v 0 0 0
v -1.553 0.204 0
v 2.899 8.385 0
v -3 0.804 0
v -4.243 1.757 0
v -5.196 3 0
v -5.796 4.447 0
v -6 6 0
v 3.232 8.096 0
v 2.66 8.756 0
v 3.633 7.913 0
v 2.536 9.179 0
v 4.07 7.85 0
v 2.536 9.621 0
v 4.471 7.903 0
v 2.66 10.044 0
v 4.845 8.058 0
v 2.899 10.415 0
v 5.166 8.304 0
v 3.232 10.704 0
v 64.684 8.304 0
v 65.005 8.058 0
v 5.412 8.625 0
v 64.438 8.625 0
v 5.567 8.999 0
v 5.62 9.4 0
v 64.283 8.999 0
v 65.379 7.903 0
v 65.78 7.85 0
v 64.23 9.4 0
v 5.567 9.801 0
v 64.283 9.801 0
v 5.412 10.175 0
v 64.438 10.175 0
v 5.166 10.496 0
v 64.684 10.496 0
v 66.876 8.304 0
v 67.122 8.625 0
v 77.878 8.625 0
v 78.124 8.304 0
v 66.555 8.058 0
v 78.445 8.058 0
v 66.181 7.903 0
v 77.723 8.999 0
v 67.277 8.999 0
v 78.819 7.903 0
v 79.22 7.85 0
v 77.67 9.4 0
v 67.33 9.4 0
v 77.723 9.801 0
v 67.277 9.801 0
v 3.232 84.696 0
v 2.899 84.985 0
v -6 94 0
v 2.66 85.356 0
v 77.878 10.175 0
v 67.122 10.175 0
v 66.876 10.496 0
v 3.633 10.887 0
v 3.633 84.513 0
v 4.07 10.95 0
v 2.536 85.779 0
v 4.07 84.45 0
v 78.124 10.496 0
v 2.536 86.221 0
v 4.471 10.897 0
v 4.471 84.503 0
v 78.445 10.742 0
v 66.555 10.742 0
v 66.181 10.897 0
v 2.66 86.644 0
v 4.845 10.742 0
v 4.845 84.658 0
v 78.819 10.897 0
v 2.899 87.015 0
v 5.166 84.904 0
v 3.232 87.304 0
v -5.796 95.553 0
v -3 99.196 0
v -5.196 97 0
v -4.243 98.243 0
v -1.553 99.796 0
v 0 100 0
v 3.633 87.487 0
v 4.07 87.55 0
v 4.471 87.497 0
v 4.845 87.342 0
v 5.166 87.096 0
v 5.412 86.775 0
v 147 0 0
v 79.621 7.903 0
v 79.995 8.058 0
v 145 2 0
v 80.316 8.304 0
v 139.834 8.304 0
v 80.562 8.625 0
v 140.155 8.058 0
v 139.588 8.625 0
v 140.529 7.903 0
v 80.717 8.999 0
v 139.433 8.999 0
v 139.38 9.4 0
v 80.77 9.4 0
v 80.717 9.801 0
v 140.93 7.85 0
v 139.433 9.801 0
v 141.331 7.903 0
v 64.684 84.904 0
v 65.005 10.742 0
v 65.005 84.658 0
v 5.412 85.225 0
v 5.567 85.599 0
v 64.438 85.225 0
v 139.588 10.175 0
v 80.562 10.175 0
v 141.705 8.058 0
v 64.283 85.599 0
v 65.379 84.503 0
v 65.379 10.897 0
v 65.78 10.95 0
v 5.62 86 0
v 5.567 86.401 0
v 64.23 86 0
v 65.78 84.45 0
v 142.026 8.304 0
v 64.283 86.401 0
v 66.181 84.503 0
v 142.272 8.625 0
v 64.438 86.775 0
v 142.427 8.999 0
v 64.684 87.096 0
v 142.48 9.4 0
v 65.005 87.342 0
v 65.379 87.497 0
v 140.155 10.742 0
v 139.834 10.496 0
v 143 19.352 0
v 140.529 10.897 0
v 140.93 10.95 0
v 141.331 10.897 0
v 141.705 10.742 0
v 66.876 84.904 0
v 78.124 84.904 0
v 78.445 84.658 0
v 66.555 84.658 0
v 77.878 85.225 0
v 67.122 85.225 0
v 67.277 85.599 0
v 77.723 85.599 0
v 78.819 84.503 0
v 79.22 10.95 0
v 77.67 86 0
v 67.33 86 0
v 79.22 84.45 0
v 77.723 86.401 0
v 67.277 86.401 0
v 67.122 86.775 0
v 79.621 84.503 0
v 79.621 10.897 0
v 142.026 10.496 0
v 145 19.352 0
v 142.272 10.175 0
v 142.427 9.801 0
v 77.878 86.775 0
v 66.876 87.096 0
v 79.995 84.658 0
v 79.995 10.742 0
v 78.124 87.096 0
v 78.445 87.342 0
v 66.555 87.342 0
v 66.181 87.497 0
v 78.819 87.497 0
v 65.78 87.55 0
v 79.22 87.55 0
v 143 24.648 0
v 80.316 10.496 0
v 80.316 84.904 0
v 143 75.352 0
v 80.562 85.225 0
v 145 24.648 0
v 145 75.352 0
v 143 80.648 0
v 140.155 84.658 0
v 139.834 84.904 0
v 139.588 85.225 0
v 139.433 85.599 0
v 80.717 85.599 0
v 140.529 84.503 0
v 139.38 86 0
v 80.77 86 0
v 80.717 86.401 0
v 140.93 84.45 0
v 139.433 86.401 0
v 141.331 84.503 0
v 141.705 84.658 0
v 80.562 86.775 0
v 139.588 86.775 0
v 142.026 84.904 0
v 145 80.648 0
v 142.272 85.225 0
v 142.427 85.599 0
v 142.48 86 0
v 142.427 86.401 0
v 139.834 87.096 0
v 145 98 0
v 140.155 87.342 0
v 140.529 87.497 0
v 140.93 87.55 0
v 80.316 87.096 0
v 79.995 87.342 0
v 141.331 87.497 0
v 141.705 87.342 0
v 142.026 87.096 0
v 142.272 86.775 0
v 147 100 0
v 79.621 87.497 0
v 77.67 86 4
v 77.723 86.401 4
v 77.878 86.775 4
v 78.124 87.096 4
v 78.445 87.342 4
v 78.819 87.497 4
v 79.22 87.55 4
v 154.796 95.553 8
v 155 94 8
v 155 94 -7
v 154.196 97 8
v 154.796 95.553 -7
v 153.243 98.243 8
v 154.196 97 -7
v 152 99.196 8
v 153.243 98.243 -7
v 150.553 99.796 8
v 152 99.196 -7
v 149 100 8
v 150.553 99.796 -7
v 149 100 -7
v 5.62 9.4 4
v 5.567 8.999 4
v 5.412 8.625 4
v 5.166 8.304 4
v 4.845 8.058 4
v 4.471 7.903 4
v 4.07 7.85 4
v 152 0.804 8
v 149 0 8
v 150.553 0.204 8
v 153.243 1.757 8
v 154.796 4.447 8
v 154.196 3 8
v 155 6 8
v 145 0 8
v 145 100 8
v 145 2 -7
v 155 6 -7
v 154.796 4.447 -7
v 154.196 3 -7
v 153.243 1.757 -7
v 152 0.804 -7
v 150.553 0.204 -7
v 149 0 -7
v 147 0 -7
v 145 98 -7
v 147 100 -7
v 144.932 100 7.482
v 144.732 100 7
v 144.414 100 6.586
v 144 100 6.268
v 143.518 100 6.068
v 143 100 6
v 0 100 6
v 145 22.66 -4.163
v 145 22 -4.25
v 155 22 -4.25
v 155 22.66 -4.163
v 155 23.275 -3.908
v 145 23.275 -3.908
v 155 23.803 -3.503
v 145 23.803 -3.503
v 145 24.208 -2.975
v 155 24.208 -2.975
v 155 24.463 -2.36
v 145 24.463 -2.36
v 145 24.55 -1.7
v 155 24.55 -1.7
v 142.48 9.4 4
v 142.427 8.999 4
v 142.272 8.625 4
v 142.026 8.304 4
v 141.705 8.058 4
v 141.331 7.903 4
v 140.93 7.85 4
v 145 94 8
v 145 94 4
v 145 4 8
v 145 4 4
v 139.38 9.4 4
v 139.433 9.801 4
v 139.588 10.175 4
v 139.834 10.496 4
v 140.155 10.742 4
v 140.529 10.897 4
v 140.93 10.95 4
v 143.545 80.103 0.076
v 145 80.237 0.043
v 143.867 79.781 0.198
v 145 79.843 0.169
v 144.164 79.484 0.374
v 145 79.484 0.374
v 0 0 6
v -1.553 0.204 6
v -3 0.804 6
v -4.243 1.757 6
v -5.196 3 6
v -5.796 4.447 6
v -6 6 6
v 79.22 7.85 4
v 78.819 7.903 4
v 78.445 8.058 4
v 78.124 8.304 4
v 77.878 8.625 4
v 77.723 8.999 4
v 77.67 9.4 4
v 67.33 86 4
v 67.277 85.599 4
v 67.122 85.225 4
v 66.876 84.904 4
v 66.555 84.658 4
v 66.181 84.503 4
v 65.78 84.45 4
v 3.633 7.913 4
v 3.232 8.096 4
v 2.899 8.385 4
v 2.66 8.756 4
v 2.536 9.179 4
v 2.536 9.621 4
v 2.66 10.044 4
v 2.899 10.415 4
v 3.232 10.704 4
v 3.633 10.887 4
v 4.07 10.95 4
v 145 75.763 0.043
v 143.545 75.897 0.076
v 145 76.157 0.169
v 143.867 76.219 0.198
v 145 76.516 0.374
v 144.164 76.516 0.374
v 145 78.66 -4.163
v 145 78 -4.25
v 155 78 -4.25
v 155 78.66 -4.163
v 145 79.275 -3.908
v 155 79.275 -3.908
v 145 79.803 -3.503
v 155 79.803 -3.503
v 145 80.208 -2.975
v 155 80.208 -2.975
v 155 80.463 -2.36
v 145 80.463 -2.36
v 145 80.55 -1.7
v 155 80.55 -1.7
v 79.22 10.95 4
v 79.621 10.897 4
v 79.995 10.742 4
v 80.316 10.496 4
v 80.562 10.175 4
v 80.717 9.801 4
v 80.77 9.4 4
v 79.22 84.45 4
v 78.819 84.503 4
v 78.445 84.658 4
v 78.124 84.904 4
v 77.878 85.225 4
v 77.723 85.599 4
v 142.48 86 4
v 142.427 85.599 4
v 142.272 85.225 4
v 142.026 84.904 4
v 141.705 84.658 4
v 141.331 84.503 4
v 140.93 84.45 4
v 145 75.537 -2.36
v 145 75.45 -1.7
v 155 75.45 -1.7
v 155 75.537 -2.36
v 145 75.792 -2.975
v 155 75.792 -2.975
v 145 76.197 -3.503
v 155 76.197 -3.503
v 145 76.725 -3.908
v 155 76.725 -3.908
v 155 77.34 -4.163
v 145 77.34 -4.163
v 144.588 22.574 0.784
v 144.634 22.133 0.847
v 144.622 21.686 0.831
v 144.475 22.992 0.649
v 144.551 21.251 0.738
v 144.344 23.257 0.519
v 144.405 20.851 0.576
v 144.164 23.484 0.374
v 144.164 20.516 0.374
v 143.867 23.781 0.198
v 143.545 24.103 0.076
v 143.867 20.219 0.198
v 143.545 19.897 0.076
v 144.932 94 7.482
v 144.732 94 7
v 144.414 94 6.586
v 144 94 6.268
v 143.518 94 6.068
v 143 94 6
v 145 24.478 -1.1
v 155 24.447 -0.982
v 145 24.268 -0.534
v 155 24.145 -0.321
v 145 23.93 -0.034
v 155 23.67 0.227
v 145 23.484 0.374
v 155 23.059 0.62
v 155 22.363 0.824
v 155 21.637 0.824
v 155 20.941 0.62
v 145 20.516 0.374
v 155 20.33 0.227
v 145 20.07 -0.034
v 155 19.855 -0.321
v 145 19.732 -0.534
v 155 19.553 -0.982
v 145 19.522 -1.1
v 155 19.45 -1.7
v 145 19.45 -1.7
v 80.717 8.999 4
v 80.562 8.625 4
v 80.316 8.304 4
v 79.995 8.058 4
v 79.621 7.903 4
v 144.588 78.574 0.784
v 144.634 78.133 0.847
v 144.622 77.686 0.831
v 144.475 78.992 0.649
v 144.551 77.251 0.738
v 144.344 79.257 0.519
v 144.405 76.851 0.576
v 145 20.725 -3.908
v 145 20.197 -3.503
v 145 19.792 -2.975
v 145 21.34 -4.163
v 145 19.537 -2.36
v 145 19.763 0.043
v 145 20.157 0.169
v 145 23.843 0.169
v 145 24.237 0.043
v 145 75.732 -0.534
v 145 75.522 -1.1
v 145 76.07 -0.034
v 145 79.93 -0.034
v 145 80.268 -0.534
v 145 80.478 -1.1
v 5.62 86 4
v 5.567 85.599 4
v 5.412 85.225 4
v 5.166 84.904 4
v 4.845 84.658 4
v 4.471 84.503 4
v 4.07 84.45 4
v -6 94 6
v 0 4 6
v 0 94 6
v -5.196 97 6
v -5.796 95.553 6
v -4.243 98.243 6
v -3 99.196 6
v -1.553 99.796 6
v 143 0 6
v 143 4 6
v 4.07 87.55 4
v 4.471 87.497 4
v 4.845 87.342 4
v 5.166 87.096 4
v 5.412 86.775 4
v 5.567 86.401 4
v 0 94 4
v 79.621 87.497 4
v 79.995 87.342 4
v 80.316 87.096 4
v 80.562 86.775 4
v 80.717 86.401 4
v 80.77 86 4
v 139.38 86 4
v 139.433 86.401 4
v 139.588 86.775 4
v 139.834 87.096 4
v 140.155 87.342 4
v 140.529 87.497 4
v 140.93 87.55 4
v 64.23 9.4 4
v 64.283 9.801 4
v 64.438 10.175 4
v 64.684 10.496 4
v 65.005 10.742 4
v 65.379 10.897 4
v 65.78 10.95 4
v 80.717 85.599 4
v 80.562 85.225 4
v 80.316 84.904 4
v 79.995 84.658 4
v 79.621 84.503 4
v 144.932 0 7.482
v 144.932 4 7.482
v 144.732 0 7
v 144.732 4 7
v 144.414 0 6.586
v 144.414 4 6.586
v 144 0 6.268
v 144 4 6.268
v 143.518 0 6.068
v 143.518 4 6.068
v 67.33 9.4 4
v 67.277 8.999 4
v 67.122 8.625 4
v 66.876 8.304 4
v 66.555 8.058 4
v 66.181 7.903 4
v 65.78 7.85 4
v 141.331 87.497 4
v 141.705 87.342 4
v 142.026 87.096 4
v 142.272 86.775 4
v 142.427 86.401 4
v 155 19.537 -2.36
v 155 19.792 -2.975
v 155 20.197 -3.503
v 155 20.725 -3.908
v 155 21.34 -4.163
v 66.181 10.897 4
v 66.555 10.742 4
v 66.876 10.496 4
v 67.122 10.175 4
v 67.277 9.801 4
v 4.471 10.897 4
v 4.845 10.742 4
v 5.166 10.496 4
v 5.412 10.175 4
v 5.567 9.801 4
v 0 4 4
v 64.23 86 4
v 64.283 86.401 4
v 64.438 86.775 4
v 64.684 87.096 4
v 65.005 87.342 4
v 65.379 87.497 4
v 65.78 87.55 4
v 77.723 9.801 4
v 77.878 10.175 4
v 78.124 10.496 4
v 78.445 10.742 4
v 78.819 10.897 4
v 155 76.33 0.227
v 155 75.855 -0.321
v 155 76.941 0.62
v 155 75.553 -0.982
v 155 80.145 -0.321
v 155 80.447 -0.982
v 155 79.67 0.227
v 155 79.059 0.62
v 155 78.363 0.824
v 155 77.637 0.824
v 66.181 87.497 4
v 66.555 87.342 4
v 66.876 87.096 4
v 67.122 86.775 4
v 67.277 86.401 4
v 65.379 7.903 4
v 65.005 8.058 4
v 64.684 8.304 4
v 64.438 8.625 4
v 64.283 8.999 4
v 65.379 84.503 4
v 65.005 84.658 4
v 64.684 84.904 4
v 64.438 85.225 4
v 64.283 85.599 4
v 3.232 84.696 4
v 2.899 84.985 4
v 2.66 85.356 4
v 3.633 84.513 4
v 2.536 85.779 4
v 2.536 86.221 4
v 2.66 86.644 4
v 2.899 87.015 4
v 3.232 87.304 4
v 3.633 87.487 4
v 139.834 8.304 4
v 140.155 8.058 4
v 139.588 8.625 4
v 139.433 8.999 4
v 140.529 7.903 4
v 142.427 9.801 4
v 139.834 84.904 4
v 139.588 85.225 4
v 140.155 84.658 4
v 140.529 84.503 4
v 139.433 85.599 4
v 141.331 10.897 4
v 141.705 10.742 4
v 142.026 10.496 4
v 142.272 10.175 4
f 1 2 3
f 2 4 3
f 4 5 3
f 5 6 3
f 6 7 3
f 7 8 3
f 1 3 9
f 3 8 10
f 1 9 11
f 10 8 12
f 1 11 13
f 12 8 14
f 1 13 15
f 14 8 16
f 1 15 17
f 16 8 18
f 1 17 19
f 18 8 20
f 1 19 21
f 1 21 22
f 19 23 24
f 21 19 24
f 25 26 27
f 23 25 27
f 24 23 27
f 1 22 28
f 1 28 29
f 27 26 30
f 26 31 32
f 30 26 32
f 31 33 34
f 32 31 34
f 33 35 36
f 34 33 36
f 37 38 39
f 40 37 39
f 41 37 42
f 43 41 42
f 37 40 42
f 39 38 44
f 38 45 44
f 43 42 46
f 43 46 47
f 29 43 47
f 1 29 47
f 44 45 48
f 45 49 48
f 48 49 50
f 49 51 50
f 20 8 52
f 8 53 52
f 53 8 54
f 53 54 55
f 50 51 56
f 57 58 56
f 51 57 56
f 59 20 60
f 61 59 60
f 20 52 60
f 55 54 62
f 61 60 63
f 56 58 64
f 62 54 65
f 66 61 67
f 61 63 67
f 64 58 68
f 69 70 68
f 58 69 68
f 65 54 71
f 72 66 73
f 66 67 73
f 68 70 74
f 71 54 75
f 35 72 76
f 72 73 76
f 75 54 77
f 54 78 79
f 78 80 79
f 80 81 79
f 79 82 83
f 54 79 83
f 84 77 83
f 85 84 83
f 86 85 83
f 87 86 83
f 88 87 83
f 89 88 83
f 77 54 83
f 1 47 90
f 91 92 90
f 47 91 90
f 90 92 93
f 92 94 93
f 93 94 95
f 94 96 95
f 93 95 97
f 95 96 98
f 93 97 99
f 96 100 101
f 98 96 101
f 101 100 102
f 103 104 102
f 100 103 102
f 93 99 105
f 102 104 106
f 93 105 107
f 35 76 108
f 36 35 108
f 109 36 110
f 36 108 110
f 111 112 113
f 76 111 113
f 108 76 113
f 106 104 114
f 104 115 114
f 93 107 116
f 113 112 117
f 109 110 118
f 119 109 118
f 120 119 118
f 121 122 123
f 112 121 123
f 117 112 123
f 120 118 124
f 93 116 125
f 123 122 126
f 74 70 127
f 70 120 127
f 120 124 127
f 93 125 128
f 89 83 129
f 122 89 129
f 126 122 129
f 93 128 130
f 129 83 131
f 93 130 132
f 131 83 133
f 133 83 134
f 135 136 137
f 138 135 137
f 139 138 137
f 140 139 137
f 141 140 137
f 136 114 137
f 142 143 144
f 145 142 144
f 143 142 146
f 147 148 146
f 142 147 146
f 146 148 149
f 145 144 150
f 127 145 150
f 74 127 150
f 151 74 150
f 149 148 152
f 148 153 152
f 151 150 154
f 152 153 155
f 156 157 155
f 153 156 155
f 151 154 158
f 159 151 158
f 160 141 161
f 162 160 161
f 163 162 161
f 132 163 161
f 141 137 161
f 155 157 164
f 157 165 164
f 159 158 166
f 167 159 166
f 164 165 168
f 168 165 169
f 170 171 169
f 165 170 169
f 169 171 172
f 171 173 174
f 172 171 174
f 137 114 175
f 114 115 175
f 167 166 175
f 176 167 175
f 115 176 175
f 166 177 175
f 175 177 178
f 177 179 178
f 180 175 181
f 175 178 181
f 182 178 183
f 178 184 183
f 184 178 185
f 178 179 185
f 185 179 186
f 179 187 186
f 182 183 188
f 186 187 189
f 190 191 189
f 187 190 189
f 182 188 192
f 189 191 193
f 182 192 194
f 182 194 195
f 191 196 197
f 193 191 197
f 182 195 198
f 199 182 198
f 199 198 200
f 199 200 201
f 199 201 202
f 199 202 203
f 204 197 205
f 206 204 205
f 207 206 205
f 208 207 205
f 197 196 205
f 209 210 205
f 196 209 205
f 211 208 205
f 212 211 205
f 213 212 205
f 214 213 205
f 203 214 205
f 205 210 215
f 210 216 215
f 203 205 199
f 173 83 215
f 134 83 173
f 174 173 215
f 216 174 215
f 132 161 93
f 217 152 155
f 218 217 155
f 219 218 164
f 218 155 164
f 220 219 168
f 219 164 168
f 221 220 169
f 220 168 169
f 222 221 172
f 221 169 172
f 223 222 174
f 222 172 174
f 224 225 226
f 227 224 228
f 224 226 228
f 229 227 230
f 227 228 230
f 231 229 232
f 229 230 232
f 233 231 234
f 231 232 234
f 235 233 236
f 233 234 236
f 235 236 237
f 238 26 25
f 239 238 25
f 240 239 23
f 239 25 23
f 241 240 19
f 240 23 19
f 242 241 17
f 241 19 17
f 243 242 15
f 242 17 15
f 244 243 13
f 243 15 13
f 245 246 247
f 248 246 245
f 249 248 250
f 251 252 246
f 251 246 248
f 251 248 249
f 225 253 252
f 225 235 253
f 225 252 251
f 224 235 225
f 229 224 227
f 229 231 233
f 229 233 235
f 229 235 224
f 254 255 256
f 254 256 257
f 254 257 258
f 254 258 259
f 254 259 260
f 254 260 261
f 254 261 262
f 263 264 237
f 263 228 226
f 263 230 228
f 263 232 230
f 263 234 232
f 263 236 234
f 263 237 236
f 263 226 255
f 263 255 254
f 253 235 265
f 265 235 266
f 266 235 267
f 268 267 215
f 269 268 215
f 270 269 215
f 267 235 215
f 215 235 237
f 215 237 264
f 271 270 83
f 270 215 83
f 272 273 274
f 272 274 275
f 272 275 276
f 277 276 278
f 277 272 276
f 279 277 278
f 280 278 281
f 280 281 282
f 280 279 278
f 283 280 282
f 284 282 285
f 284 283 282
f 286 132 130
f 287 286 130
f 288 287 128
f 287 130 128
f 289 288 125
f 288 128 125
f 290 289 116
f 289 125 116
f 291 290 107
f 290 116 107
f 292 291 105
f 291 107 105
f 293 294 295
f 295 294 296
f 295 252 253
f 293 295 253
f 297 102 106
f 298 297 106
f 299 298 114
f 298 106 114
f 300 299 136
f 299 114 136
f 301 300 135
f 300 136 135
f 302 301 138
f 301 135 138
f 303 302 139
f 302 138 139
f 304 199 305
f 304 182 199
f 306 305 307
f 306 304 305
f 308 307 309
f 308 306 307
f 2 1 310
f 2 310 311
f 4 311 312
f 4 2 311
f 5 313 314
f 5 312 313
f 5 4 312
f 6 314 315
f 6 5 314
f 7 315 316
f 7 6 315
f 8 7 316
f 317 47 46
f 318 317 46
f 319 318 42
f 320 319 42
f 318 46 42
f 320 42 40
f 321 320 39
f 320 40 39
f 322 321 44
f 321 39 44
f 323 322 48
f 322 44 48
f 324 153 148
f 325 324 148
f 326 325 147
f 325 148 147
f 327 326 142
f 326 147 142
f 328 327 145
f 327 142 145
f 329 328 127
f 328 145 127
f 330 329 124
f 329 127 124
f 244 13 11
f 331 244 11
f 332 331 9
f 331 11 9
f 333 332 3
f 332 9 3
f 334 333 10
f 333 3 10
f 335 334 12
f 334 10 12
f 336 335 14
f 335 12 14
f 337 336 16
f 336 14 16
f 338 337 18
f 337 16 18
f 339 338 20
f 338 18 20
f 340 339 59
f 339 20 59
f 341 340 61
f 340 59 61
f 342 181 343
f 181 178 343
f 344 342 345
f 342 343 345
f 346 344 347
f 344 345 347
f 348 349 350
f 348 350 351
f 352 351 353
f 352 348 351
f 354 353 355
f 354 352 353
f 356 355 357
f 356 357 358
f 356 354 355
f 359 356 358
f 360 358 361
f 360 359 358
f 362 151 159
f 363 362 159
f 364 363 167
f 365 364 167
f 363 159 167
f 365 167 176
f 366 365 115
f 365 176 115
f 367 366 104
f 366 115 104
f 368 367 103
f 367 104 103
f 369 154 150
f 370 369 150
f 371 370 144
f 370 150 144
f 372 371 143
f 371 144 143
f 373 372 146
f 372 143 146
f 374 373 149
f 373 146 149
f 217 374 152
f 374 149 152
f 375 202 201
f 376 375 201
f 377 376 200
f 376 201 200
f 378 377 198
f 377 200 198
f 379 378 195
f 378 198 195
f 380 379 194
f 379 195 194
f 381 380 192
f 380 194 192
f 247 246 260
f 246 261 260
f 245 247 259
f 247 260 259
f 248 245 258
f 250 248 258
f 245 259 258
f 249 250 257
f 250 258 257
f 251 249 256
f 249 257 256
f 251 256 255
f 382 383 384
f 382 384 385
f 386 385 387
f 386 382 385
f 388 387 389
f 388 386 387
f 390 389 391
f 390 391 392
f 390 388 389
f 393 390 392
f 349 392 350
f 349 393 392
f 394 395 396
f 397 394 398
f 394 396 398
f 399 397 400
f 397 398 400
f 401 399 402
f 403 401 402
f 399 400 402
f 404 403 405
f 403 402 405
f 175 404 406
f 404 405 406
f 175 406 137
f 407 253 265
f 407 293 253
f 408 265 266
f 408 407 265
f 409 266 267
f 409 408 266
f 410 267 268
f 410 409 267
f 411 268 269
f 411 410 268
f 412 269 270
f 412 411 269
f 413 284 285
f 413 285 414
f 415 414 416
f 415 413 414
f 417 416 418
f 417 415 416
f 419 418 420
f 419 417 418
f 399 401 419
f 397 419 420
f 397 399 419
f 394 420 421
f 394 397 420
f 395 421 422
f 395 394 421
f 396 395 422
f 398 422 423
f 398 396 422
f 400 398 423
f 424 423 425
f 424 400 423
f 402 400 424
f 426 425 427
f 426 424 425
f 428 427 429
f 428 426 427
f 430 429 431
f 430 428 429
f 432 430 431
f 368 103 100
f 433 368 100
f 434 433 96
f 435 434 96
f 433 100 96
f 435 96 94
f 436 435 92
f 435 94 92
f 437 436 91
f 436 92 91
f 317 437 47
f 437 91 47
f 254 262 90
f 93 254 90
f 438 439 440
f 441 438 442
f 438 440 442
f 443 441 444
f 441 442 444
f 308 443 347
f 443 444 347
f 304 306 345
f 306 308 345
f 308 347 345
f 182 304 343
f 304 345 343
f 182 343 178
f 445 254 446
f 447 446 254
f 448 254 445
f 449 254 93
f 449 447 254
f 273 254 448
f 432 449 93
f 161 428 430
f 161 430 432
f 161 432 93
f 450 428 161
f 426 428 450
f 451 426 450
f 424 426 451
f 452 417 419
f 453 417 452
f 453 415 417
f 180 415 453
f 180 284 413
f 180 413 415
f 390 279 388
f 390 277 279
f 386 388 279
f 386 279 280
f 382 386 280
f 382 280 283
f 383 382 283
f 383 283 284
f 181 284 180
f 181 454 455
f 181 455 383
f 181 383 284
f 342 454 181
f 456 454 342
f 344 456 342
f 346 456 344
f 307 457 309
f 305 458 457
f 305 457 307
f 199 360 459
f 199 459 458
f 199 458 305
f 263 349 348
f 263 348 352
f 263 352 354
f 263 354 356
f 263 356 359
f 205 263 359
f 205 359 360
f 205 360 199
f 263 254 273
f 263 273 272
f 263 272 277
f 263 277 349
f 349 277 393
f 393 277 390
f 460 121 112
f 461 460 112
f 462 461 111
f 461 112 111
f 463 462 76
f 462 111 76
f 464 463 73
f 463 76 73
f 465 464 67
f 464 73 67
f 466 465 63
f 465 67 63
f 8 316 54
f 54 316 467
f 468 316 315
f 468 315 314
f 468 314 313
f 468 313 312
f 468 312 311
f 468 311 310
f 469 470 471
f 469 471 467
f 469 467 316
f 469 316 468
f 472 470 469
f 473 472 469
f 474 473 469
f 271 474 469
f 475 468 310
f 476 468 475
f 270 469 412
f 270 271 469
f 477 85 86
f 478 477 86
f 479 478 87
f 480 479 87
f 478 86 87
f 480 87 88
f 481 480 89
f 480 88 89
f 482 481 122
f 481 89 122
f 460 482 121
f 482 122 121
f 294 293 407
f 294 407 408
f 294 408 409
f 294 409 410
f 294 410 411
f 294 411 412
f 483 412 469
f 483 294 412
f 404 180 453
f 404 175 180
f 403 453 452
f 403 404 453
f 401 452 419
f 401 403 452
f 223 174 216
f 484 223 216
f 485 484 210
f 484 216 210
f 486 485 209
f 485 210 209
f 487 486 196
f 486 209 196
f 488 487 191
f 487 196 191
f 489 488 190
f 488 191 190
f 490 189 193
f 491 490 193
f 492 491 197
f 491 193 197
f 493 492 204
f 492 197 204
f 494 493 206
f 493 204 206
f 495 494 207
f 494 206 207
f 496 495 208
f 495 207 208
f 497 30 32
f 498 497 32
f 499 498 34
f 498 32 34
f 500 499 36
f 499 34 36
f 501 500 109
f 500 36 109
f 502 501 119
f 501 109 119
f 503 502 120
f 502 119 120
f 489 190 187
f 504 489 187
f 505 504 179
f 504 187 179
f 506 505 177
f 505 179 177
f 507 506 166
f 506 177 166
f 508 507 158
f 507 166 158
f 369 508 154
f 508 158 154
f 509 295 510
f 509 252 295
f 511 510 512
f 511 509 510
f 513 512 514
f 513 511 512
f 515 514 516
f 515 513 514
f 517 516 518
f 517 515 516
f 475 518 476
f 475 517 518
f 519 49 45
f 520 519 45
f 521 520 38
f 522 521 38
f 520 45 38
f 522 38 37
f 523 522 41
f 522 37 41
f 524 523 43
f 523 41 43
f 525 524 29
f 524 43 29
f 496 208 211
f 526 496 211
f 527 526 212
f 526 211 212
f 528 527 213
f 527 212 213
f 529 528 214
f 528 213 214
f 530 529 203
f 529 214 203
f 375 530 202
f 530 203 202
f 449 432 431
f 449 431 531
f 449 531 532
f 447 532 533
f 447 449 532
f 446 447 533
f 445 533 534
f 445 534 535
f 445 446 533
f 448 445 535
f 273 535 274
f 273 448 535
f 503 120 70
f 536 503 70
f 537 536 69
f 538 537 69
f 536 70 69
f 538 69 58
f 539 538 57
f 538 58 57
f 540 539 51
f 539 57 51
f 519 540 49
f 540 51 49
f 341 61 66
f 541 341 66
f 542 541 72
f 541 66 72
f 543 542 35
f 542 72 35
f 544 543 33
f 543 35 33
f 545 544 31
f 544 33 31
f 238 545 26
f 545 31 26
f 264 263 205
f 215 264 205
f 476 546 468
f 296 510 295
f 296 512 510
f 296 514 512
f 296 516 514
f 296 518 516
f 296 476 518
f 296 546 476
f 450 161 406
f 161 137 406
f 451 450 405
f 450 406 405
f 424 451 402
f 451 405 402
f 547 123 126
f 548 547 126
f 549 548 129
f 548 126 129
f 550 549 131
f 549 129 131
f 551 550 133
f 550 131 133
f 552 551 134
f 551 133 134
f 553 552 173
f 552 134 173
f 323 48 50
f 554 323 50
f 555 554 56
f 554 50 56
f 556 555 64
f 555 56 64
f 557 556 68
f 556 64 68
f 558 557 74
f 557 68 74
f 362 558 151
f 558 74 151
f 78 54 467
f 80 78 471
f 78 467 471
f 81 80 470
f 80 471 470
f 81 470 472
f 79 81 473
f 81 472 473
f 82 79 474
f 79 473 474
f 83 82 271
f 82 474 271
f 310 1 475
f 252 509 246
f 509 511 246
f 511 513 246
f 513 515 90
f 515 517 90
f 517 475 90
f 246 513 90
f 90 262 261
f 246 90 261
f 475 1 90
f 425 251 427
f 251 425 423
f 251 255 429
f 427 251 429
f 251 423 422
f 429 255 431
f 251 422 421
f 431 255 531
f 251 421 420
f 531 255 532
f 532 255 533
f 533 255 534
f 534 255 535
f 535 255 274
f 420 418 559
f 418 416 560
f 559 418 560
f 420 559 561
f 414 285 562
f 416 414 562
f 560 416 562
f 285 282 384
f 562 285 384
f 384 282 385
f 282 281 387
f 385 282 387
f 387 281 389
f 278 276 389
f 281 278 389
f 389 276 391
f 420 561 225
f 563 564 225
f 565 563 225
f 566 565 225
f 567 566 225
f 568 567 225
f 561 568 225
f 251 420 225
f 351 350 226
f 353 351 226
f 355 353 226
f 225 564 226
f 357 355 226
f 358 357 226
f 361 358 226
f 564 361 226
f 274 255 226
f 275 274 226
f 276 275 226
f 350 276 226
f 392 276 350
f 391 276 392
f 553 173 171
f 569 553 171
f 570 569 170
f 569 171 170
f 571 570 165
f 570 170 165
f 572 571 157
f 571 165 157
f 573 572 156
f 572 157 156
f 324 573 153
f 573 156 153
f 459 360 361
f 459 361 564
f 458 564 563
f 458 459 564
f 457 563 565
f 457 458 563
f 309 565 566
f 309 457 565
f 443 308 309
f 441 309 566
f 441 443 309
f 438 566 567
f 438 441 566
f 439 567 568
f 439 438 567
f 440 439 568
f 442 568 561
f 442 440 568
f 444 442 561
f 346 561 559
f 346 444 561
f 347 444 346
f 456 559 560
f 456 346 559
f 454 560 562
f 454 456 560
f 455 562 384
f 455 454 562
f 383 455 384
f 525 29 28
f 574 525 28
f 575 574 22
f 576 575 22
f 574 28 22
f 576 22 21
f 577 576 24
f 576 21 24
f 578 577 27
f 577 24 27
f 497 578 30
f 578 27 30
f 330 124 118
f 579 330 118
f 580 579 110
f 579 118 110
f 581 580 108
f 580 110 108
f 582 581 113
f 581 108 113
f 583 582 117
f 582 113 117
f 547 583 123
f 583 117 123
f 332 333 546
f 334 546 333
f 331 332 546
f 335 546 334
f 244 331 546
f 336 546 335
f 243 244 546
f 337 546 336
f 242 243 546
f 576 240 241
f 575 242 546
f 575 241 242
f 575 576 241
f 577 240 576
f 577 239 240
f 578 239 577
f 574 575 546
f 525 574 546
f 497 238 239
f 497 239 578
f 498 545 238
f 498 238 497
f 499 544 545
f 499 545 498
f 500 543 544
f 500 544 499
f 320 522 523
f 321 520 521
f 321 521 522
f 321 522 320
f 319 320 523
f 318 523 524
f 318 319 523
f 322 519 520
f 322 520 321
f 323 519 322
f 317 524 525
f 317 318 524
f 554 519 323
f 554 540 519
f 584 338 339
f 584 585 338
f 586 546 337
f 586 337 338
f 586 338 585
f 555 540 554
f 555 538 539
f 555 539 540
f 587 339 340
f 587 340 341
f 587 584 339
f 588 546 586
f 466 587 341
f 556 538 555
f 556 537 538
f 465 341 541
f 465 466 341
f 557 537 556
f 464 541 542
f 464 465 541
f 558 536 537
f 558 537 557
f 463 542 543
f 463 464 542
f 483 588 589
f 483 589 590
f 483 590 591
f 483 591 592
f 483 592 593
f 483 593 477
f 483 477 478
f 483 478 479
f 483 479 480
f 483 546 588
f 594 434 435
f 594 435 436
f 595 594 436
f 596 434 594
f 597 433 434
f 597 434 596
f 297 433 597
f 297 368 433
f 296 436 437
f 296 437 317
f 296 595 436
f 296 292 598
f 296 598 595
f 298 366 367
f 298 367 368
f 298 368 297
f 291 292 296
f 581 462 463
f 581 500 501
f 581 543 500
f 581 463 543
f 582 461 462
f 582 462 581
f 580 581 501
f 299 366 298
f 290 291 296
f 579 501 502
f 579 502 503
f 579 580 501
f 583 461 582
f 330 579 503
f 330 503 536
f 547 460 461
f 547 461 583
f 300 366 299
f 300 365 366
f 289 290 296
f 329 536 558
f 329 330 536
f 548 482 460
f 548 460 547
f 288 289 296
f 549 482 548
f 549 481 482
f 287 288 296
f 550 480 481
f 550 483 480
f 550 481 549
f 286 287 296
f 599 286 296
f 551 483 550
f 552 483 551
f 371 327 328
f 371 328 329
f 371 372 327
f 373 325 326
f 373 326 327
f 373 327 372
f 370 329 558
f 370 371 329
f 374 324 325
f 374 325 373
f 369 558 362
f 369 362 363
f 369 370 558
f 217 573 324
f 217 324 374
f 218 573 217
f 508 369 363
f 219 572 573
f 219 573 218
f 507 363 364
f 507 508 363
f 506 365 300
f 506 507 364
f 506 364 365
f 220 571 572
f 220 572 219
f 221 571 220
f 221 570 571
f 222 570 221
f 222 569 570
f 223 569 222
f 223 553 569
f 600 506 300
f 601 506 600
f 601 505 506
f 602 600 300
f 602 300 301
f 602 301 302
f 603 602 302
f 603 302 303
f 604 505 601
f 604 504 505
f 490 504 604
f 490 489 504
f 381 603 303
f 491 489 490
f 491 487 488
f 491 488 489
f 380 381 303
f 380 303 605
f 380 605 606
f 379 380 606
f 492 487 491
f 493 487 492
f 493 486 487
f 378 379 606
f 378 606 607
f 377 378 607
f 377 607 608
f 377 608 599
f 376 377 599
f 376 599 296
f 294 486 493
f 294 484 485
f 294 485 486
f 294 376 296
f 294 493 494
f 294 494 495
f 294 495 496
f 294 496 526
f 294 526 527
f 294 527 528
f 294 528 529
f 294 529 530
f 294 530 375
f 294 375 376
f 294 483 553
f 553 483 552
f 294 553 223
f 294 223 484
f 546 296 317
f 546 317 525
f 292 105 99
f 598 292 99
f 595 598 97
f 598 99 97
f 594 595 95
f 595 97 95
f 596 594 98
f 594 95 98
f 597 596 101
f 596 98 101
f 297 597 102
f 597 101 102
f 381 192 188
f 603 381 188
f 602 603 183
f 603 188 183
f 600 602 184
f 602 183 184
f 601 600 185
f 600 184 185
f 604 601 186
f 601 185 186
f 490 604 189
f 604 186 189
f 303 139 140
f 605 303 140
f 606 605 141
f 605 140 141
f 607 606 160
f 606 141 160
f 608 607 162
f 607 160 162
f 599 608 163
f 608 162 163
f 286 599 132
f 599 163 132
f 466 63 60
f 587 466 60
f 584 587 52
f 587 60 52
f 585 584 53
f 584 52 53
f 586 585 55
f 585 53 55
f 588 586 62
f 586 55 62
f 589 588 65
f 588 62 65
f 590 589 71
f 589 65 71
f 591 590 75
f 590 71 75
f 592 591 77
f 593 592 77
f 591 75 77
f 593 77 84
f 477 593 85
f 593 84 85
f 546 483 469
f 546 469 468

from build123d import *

# Parameters (mm, degrees)
SKETCH1_W                       = 5.3
SKETCH1_H                       = 76.6
SKETCH1_H_2                     = 9.4
SKETCH1_H_3                     = 14
BOSS_EXTRUDE1_DEPTH             = 4
BOSS_EXTRUDE2_DEPTH             = 100
BOSS_EXTRUDE3_REACH             = 186.786
BOSS_EXTRUDE3_DIRECTION_2_REACH = 186.786
FILLET1_R                       = 6
CHAMFER1_SIZE                   = 2
CUT_EXTRUDE1_START              = -4
CUT_EXTRUDE1_DEPTH              = 4
BOSS_EXTRUDE4_DEPTH             = 2
FILLET3_R                       = 2
CUT_EXTRUDE2_START              = -10
CUT_EXTRUDE2_DEPTH              = 10
FILLET4_R                       = 2
FILLET5_R                       = 2


# Some blends are built 0.0001 mm under size
with BuildPart() as part:
    # Sketch1 → Boss-Extrude1 (new body)
    with BuildSketch(Plane.XY):
        with BuildLine():
            Line((0, 100), (0, 0))
            Line((0, 0), (4.07, 0))
            Line((4.07, 0), (4.07, 7.85))
            ThreePointArc((4.07, 7.85), (2.52, 9.4), (4.07, 10.95))
            Line((4.07, 10.95), (4.07, 84.45))
            ThreePointArc((4.07, 84.45), (2.52, 86), (4.07, 87.55))
            Line((4.07, 87.55), (4.07, 100))
            Line((4.07, 100), (0, 100))
        make_face()
        with BuildLine():
            Line((65.78, 100), (4.07, 100))
            Line((4.07, 100), (4.07, 87.55))
            ThreePointArc((4.07, 87.55), (5.166015511, 87.096015511), (5.62, 86))
            Line((5.62, 86), (64.23, 86))
            ThreePointArc((64.23, 86), (64.683984489, 87.096015511), (65.78, 87.55))
            Line((65.78, 87.55), (65.78, 100))
        make_face()
        with BuildLine():
            Line((4.07, 84.45), (4.07, 10.95))
            ThreePointArc((4.07, 10.95), (5.166015511, 10.496015511), (5.62, 9.4))
            Line((5.62, 9.4), (64.23, 9.4))
            ThreePointArc((64.23, 9.4), (64.683984489, 10.496015511), (65.78, 10.95))
            Line((65.78, 10.95), (65.78, 84.45))
            ThreePointArc((65.78, 84.45), (64.683984489, 84.903984489), (64.23, 86))
            Line((64.23, 86), (5.62, 86))
            ThreePointArc((5.62, 86), (5.166015511, 84.903984489), (4.07, 84.45))
        make_face()
        with BuildLine():
            Line((4.07, 7.85), (4.07, 0))
            Line((4.07, 0), (65.78, 0))
            Line((65.78, 0), (65.78, 7.85))
            ThreePointArc((65.78, 7.85), (64.683984489, 8.303984489), (64.23, 9.4))
            Line((64.23, 9.4), (5.62, 9.4))
            ThreePointArc((5.62, 9.4), (5.166015511, 8.303984489), (4.07, 7.85))
        make_face()
        with BuildLine():
            Line((67.33, 9.4), (69.85, 9.4))
            Line((69.85, 9.4), (69.85, 86))
            Line((69.85, 86), (67.33, 86))
            ThreePointArc((67.33, 86), (66.876015511, 84.903984489), (65.78, 84.45))
            Line((65.78, 84.45), (65.78, 10.95))
            ThreePointArc((65.78, 10.95), (66.876015511, 10.496015511), (67.33, 9.4))
        make_face()
        with Locations((72.5, 47.7)):
            Rectangle(SKETCH1_W, SKETCH1_H)
        with BuildLine():
            Line((75.15, 86), (75.15, 9.4))
            Line((75.15, 9.4), (77.67, 9.4))
            ThreePointArc((77.67, 9.4), (78.123984489, 10.496015511), (79.22, 10.95))
            Line((79.22, 10.95), (79.22, 84.45))
            ThreePointArc((79.22, 84.45), (78.123984489, 84.903984489), (77.67, 86))
            Line((77.67, 86), (75.15, 86))
        make_face()
        with BuildLine():
            Line((65.78, 7.85), (65.78, 0))
            Line((65.78, 0), (69.85, 0))
            Line((69.85, 0), (69.85, 9.4))
            Line((69.85, 9.4), (67.33, 9.4))
            ThreePointArc((67.33, 9.4), (66.876015511, 8.303984489), (65.78, 7.85))
        make_face()
        with Locations((72.5, 4.7)):
            Rectangle(SKETCH1_W, SKETCH1_H_2)
        with BuildLine():
            Line((75.15, 9.4), (75.15, 0))
            Line((75.15, 0), (79.22, 0))
            Line((79.22, 0), (79.22, 7.85))
            ThreePointArc((79.22, 7.85), (78.123984489, 8.303984489), (77.67, 9.4))
            Line((77.67, 9.4), (75.15, 9.4))
        make_face()
        with BuildLine():
            Line((69.85, 100), (65.78, 100))
            Line((65.78, 100), (65.78, 87.55))
            ThreePointArc((65.78, 87.55), (66.876015511, 87.096015511), (67.33, 86))
            Line((67.33, 86), (69.85, 86))
            Line((69.85, 86), (69.85, 100))
        make_face()
        with Locations((72.5, 93)):
            Rectangle(SKETCH1_W, SKETCH1_H_3)
        with BuildLine():
            Line((79.22, 100), (75.15, 100))
            Line((75.15, 100), (75.15, 86))
            Line((75.15, 86), (77.67, 86))
            ThreePointArc((77.67, 86), (78.123984489, 87.096015511), (79.22, 87.55))
            Line((79.22, 87.55), (79.22, 100))
        make_face()
        with BuildLine():
            Line((140.93, 100), (79.22, 100))
            Line((79.22, 100), (79.22, 87.55))
            ThreePointArc((79.22, 87.55), (80.316015511, 87.096015511), (80.77, 86))
            Line((80.77, 86), (139.38, 86))
            ThreePointArc((139.38, 86), (139.833984489, 87.096015511), (140.93, 87.55))
            Line((140.93, 87.55), (140.93, 100))
        make_face()
        with BuildLine():
            ThreePointArc((79.22, 10.95), (80.316015511, 10.496015511), (80.77, 9.4))
            Line((80.77, 9.4), (139.38, 9.4))
            ThreePointArc((139.38, 9.4), (139.833984489, 10.496015511), (140.93, 10.95))
            Line((140.93, 10.95), (140.93, 84.45))
            ThreePointArc((140.93, 84.45), (139.833984489, 84.903984489), (139.38, 86))
            Line((139.38, 86), (80.77, 86))
            ThreePointArc((80.77, 86), (80.316015511, 84.903984489), (79.22, 84.45))
            Line((79.22, 84.45), (79.22, 10.95))
        make_face()
        with BuildLine():
            Line((140.93, 7.85), (140.93, 0))
            Line((140.93, 0), (145, 0))
            Line((145, 0), (145, 100))
            Line((145, 100), (140.93, 100))
            Line((140.93, 100), (140.93, 87.55))
            ThreePointArc((140.93, 87.55), (142.026015511, 87.096015511), (142.48, 86))
            ThreePointArc((142.48, 86), (142.026015511, 84.903984489), (140.93, 84.45))
            Line((140.93, 84.45), (140.93, 10.95))
            ThreePointArc((140.93, 10.95), (142.026015511, 10.496015511), (142.48, 9.4))
            ThreePointArc((142.48, 9.4), (142.026015511, 8.303984489), (140.93, 7.85))
        make_face()
        with BuildLine():
            Line((79.22, 7.85), (79.22, 0))
            Line((79.22, 0), (140.93, 0))
            Line((140.93, 0), (140.93, 7.85))
            ThreePointArc((140.93, 7.85), (139.833984489, 8.303984489), (139.38, 9.4))
            Line((139.38, 9.4), (80.77, 9.4))
            ThreePointArc((80.77, 9.4), (80.316015511, 8.303984489), (79.22, 7.85))
        make_face()
    extrude(amount=BOSS_EXTRUDE1_DEPTH)

    # Sketch2 → Boss-Extrude2 (add)
    with BuildSketch(Plane(origin=(0, 100, 0), x_dir=(1, 0, 0), z_dir=(0, 1, 0))):
        Polygon((145, 7), (145, 0), (145, -4), (145, -10), (155, -10), (155, 7), align=None)
    extrude(amount=-BOSS_EXTRUDE2_DEPTH)

    # Boss-Extrude3: up to this face of the body (flat: up to its plane)
    boss_extrude3_end = Plane(part.part.faces().sort_by_distance((150, 50, 10))[0])
    # Sketch3 → Boss-Extrude3 (add, up to the picked face)
    with BuildSketch(Plane.XY.offset(4), mode=Mode.PRIVATE) as boss_extrude3_sk1:
        Polygon((145, 100), (145, 94), (0, 94), (0, 4), (145, 4), (145, 0), (0, 0), (-6, 0), (-6, 100), align=None)
    boss_extrude3_tool1 = split(extrude(boss_extrude3_sk1.sketch, amount=BOSS_EXTRUDE3_REACH, mode=Mode.PRIVATE), bisect_by=boss_extrude3_end, keep=Keep.BOTH, mode=Mode.PRIVATE)
    add(boss_extrude3_tool1.solids().sort_by(Axis((143.188895, 97, 4), (0, 0, 1)))[0])

    # Boss-Extrude3 direction 2: up to this face of the body (flat: up to its plane)
    boss_extrude3_direction_2_end = Plane(part.part.faces().sort_by_distance((72.5, 50.009617792, 0))[0])
    # Sketch3 → Boss-Extrude3 direction 2 (add, up to the picked face)
    with BuildSketch(Plane.XY.offset(4), mode=Mode.PRIVATE) as boss_extrude3_direction_2_sk1:
        Polygon((145, 100), (145, 94), (0, 94), (0, 4), (145, 4), (145, 0), (0, 0), (-6, 0), (-6, 100), align=None)
    boss_extrude3_direction_2_tool1 = split(extrude(boss_extrude3_direction_2_sk1.sketch, amount=-BOSS_EXTRUDE3_DIRECTION_2_REACH, mode=Mode.PRIVATE), bisect_by=boss_extrude3_direction_2_end, keep=Keep.BOTH, mode=Mode.PRIVATE)
    add(boss_extrude3_direction_2_tool1.solids().sort_by(Axis((143.188895, 97, 4), (0, 0, -1)))[0])

    # Fillet1
    fillet1_edges = [part.edges().sort_by_distance(p)[0] for p in [
        (155, 100, 1.5),
        (155, 0, 1.5),
        (-6, 0, 5),
        (-6, 100, 5),
    ]]
    fillet(fillet1_edges, radius=FILLET1_R)

    # Chamfer1
    chamfer1_edges = [part.edges().sort_by_distance(p)[0] for p in [
        (145, 0, -3.5),
        (145, 100, -3.5),
    ]]
    chamfer(chamfer1_edges, length=CHAMFER1_SIZE)

    # Sketch4 → Cut-Extrude1 (cut)
    with BuildSketch(Plane.XY.offset(10).offset(CUT_EXTRUDE1_START)):
        with BuildLine():
            Line((-6, 94), (-6, 6))
            ThreePointArc((-6, 6), (-4.242640687, 1.757359313), (0, 0))
            Line((0, 0), (149, 0))
            ThreePointArc((149, 0), (153.242640687, 1.757359313), (155, 6))
            Line((155, 6), (155, 94))
            ThreePointArc((155, 94), (153.242640687, 98.242640687), (149, 100))
            Line((149, 100), (0, 100))
            ThreePointArc((0, 100), (-4.242640687, 98.242640687), (-6, 94))
        make_face()
    extrude(amount=CUT_EXTRUDE1_DEPTH, mode=Mode.SUBTRACT)

    # Sketch5 → Boss-Extrude4 (add)
    with BuildSketch(Plane.XY.offset(6)):
        with BuildLine():
            Line((145, 100), (145, 94))
            Line((145, 94), (145, 4))
            Line((145, 4), (145, 0))
            Line((145, 0), (149, 0))
            ThreePointArc((149, 0), (153.242640687, 1.757359313), (155, 6))
            Line((155, 6), (155, 94))
            ThreePointArc((155, 94), (153.242640687, 98.242640687), (149, 100))
            Line((149, 100), (145, 100))
        make_face()
    extrude(amount=BOSS_EXTRUDE4_DEPTH)

    # Fillet3
    fillet3_edges = [part.edges().sort_by_distance(p)[0] for p in [
        (145, 2, 6),
        (145, 97, 6),
    ]]
    fillet(fillet3_edges, radius=FILLET3_R - 0.0001)  # a hair under: the kernel refuses the full size

    # Sketch6 → Cut-Extrude2 (cut)
    with BuildSketch(Plane(origin=(155, 0, 0), x_dir=(0, 0, -1), z_dir=(1, 0, 0)).offset(CUT_EXTRUDE2_START)):
        with BuildLine():
            ThreePointArc((4.25, 78), (3.503122292, 79.803122292), (1.7, 80.55))
            Line((1.7, 80.55), (1.7, 78))
            Line((1.7, 78), (1.7, 75.45))
            ThreePointArc((1.7, 75.45), (3.503122292, 76.196877708), (4.25, 78))
        make_face()
        with BuildLine():
            Line((1.7, 78), (1.7, 80.55))
            ThreePointArc((1.7, 80.55), (-0.85, 78), (1.7, 75.45))
            Line((1.7, 75.45), (1.7, 78))
        make_face()
        with BuildLine():
            ThreePointArc((4.25, 22), (3.503122292, 23.803122292), (1.7, 24.55))
            Line((1.7, 24.55), (1.7, 22))
            Line((1.7, 22), (1.7, 19.45))
            ThreePointArc((1.7, 19.45), (3.503122292, 20.196877708), (4.25, 22))
        make_face()
        with BuildLine():
            Line((1.7, 22), (1.7, 24.55))
            ThreePointArc((1.7, 24.55), (-0.85, 22), (1.7, 19.45))
            Line((1.7, 19.45), (1.7, 22))
        make_face()
    extrude(amount=CUT_EXTRUDE2_DEPTH, mode=Mode.SUBTRACT)

    # Fillet4
    # the kernel refuses this fillet: 2 mm, written as the material it takes off along each edge
    with BuildSketch(Plane(origin=(145, 15.099342219, 0), x_dir=(-1, 0, 0), z_dir=(0, 1, 0))) as fillet4_piece_1_section:
        with BuildLine():
            CenterArc((FILLET4_R, FILLET4_R), FILLET4_R, 180, 90)
            Line((0, FILLET4_R), (0, 0))
            Line((0, 0), (FILLET4_R, 0))
        make_face()
    fillet4_piece_1 = extrude(amount=13.801315562, mode=Mode.PRIVATE)
    fillet4_piece_1 = fillet4_piece_1 & Plane(origin=(144.444640092, 22, -1.7), x_dir=(0, -1, 0), z_dir=(-1, 0, 0)) * Cylinder(2.55, 36, mode=Mode.PRIVATE)
    add(fillet4_piece_1, mode=Mode.SUBTRACT)
    with BuildSketch(Plane(origin=(145, 71.099342219, 0), x_dir=(-1, 0, 0), z_dir=(0, 1, 0))) as fillet4_piece_2_section:
        with BuildLine():
            CenterArc((FILLET4_R, FILLET4_R), FILLET4_R, 180, 90)
            Line((0, FILLET4_R), (0, 0))
            Line((0, 0), (FILLET4_R, 0))
        make_face()
    fillet4_piece_2 = extrude(amount=13.801315562, mode=Mode.PRIVATE)
    fillet4_piece_2 = fillet4_piece_2 & Plane(origin=(144.444640092, 78, -1.7), x_dir=(0, -1, 0), z_dir=(-1, 0, 0)) * Cylinder(2.55, 36, mode=Mode.PRIVATE)
    add(fillet4_piece_2, mode=Mode.SUBTRACT)

    # Fillet5
    fillet5_edges = [part.edges().sort_by_distance(p)[0] for p in [
        (144, 76.099342219, 0),
        (144, 79.900657781, 0),
        (144, 20.099342219, 0),
        (144, 23.900657781, 0),
    ]]
    fillet(fillet5_edges, radius=FILLET5_R)


solid = part.part
